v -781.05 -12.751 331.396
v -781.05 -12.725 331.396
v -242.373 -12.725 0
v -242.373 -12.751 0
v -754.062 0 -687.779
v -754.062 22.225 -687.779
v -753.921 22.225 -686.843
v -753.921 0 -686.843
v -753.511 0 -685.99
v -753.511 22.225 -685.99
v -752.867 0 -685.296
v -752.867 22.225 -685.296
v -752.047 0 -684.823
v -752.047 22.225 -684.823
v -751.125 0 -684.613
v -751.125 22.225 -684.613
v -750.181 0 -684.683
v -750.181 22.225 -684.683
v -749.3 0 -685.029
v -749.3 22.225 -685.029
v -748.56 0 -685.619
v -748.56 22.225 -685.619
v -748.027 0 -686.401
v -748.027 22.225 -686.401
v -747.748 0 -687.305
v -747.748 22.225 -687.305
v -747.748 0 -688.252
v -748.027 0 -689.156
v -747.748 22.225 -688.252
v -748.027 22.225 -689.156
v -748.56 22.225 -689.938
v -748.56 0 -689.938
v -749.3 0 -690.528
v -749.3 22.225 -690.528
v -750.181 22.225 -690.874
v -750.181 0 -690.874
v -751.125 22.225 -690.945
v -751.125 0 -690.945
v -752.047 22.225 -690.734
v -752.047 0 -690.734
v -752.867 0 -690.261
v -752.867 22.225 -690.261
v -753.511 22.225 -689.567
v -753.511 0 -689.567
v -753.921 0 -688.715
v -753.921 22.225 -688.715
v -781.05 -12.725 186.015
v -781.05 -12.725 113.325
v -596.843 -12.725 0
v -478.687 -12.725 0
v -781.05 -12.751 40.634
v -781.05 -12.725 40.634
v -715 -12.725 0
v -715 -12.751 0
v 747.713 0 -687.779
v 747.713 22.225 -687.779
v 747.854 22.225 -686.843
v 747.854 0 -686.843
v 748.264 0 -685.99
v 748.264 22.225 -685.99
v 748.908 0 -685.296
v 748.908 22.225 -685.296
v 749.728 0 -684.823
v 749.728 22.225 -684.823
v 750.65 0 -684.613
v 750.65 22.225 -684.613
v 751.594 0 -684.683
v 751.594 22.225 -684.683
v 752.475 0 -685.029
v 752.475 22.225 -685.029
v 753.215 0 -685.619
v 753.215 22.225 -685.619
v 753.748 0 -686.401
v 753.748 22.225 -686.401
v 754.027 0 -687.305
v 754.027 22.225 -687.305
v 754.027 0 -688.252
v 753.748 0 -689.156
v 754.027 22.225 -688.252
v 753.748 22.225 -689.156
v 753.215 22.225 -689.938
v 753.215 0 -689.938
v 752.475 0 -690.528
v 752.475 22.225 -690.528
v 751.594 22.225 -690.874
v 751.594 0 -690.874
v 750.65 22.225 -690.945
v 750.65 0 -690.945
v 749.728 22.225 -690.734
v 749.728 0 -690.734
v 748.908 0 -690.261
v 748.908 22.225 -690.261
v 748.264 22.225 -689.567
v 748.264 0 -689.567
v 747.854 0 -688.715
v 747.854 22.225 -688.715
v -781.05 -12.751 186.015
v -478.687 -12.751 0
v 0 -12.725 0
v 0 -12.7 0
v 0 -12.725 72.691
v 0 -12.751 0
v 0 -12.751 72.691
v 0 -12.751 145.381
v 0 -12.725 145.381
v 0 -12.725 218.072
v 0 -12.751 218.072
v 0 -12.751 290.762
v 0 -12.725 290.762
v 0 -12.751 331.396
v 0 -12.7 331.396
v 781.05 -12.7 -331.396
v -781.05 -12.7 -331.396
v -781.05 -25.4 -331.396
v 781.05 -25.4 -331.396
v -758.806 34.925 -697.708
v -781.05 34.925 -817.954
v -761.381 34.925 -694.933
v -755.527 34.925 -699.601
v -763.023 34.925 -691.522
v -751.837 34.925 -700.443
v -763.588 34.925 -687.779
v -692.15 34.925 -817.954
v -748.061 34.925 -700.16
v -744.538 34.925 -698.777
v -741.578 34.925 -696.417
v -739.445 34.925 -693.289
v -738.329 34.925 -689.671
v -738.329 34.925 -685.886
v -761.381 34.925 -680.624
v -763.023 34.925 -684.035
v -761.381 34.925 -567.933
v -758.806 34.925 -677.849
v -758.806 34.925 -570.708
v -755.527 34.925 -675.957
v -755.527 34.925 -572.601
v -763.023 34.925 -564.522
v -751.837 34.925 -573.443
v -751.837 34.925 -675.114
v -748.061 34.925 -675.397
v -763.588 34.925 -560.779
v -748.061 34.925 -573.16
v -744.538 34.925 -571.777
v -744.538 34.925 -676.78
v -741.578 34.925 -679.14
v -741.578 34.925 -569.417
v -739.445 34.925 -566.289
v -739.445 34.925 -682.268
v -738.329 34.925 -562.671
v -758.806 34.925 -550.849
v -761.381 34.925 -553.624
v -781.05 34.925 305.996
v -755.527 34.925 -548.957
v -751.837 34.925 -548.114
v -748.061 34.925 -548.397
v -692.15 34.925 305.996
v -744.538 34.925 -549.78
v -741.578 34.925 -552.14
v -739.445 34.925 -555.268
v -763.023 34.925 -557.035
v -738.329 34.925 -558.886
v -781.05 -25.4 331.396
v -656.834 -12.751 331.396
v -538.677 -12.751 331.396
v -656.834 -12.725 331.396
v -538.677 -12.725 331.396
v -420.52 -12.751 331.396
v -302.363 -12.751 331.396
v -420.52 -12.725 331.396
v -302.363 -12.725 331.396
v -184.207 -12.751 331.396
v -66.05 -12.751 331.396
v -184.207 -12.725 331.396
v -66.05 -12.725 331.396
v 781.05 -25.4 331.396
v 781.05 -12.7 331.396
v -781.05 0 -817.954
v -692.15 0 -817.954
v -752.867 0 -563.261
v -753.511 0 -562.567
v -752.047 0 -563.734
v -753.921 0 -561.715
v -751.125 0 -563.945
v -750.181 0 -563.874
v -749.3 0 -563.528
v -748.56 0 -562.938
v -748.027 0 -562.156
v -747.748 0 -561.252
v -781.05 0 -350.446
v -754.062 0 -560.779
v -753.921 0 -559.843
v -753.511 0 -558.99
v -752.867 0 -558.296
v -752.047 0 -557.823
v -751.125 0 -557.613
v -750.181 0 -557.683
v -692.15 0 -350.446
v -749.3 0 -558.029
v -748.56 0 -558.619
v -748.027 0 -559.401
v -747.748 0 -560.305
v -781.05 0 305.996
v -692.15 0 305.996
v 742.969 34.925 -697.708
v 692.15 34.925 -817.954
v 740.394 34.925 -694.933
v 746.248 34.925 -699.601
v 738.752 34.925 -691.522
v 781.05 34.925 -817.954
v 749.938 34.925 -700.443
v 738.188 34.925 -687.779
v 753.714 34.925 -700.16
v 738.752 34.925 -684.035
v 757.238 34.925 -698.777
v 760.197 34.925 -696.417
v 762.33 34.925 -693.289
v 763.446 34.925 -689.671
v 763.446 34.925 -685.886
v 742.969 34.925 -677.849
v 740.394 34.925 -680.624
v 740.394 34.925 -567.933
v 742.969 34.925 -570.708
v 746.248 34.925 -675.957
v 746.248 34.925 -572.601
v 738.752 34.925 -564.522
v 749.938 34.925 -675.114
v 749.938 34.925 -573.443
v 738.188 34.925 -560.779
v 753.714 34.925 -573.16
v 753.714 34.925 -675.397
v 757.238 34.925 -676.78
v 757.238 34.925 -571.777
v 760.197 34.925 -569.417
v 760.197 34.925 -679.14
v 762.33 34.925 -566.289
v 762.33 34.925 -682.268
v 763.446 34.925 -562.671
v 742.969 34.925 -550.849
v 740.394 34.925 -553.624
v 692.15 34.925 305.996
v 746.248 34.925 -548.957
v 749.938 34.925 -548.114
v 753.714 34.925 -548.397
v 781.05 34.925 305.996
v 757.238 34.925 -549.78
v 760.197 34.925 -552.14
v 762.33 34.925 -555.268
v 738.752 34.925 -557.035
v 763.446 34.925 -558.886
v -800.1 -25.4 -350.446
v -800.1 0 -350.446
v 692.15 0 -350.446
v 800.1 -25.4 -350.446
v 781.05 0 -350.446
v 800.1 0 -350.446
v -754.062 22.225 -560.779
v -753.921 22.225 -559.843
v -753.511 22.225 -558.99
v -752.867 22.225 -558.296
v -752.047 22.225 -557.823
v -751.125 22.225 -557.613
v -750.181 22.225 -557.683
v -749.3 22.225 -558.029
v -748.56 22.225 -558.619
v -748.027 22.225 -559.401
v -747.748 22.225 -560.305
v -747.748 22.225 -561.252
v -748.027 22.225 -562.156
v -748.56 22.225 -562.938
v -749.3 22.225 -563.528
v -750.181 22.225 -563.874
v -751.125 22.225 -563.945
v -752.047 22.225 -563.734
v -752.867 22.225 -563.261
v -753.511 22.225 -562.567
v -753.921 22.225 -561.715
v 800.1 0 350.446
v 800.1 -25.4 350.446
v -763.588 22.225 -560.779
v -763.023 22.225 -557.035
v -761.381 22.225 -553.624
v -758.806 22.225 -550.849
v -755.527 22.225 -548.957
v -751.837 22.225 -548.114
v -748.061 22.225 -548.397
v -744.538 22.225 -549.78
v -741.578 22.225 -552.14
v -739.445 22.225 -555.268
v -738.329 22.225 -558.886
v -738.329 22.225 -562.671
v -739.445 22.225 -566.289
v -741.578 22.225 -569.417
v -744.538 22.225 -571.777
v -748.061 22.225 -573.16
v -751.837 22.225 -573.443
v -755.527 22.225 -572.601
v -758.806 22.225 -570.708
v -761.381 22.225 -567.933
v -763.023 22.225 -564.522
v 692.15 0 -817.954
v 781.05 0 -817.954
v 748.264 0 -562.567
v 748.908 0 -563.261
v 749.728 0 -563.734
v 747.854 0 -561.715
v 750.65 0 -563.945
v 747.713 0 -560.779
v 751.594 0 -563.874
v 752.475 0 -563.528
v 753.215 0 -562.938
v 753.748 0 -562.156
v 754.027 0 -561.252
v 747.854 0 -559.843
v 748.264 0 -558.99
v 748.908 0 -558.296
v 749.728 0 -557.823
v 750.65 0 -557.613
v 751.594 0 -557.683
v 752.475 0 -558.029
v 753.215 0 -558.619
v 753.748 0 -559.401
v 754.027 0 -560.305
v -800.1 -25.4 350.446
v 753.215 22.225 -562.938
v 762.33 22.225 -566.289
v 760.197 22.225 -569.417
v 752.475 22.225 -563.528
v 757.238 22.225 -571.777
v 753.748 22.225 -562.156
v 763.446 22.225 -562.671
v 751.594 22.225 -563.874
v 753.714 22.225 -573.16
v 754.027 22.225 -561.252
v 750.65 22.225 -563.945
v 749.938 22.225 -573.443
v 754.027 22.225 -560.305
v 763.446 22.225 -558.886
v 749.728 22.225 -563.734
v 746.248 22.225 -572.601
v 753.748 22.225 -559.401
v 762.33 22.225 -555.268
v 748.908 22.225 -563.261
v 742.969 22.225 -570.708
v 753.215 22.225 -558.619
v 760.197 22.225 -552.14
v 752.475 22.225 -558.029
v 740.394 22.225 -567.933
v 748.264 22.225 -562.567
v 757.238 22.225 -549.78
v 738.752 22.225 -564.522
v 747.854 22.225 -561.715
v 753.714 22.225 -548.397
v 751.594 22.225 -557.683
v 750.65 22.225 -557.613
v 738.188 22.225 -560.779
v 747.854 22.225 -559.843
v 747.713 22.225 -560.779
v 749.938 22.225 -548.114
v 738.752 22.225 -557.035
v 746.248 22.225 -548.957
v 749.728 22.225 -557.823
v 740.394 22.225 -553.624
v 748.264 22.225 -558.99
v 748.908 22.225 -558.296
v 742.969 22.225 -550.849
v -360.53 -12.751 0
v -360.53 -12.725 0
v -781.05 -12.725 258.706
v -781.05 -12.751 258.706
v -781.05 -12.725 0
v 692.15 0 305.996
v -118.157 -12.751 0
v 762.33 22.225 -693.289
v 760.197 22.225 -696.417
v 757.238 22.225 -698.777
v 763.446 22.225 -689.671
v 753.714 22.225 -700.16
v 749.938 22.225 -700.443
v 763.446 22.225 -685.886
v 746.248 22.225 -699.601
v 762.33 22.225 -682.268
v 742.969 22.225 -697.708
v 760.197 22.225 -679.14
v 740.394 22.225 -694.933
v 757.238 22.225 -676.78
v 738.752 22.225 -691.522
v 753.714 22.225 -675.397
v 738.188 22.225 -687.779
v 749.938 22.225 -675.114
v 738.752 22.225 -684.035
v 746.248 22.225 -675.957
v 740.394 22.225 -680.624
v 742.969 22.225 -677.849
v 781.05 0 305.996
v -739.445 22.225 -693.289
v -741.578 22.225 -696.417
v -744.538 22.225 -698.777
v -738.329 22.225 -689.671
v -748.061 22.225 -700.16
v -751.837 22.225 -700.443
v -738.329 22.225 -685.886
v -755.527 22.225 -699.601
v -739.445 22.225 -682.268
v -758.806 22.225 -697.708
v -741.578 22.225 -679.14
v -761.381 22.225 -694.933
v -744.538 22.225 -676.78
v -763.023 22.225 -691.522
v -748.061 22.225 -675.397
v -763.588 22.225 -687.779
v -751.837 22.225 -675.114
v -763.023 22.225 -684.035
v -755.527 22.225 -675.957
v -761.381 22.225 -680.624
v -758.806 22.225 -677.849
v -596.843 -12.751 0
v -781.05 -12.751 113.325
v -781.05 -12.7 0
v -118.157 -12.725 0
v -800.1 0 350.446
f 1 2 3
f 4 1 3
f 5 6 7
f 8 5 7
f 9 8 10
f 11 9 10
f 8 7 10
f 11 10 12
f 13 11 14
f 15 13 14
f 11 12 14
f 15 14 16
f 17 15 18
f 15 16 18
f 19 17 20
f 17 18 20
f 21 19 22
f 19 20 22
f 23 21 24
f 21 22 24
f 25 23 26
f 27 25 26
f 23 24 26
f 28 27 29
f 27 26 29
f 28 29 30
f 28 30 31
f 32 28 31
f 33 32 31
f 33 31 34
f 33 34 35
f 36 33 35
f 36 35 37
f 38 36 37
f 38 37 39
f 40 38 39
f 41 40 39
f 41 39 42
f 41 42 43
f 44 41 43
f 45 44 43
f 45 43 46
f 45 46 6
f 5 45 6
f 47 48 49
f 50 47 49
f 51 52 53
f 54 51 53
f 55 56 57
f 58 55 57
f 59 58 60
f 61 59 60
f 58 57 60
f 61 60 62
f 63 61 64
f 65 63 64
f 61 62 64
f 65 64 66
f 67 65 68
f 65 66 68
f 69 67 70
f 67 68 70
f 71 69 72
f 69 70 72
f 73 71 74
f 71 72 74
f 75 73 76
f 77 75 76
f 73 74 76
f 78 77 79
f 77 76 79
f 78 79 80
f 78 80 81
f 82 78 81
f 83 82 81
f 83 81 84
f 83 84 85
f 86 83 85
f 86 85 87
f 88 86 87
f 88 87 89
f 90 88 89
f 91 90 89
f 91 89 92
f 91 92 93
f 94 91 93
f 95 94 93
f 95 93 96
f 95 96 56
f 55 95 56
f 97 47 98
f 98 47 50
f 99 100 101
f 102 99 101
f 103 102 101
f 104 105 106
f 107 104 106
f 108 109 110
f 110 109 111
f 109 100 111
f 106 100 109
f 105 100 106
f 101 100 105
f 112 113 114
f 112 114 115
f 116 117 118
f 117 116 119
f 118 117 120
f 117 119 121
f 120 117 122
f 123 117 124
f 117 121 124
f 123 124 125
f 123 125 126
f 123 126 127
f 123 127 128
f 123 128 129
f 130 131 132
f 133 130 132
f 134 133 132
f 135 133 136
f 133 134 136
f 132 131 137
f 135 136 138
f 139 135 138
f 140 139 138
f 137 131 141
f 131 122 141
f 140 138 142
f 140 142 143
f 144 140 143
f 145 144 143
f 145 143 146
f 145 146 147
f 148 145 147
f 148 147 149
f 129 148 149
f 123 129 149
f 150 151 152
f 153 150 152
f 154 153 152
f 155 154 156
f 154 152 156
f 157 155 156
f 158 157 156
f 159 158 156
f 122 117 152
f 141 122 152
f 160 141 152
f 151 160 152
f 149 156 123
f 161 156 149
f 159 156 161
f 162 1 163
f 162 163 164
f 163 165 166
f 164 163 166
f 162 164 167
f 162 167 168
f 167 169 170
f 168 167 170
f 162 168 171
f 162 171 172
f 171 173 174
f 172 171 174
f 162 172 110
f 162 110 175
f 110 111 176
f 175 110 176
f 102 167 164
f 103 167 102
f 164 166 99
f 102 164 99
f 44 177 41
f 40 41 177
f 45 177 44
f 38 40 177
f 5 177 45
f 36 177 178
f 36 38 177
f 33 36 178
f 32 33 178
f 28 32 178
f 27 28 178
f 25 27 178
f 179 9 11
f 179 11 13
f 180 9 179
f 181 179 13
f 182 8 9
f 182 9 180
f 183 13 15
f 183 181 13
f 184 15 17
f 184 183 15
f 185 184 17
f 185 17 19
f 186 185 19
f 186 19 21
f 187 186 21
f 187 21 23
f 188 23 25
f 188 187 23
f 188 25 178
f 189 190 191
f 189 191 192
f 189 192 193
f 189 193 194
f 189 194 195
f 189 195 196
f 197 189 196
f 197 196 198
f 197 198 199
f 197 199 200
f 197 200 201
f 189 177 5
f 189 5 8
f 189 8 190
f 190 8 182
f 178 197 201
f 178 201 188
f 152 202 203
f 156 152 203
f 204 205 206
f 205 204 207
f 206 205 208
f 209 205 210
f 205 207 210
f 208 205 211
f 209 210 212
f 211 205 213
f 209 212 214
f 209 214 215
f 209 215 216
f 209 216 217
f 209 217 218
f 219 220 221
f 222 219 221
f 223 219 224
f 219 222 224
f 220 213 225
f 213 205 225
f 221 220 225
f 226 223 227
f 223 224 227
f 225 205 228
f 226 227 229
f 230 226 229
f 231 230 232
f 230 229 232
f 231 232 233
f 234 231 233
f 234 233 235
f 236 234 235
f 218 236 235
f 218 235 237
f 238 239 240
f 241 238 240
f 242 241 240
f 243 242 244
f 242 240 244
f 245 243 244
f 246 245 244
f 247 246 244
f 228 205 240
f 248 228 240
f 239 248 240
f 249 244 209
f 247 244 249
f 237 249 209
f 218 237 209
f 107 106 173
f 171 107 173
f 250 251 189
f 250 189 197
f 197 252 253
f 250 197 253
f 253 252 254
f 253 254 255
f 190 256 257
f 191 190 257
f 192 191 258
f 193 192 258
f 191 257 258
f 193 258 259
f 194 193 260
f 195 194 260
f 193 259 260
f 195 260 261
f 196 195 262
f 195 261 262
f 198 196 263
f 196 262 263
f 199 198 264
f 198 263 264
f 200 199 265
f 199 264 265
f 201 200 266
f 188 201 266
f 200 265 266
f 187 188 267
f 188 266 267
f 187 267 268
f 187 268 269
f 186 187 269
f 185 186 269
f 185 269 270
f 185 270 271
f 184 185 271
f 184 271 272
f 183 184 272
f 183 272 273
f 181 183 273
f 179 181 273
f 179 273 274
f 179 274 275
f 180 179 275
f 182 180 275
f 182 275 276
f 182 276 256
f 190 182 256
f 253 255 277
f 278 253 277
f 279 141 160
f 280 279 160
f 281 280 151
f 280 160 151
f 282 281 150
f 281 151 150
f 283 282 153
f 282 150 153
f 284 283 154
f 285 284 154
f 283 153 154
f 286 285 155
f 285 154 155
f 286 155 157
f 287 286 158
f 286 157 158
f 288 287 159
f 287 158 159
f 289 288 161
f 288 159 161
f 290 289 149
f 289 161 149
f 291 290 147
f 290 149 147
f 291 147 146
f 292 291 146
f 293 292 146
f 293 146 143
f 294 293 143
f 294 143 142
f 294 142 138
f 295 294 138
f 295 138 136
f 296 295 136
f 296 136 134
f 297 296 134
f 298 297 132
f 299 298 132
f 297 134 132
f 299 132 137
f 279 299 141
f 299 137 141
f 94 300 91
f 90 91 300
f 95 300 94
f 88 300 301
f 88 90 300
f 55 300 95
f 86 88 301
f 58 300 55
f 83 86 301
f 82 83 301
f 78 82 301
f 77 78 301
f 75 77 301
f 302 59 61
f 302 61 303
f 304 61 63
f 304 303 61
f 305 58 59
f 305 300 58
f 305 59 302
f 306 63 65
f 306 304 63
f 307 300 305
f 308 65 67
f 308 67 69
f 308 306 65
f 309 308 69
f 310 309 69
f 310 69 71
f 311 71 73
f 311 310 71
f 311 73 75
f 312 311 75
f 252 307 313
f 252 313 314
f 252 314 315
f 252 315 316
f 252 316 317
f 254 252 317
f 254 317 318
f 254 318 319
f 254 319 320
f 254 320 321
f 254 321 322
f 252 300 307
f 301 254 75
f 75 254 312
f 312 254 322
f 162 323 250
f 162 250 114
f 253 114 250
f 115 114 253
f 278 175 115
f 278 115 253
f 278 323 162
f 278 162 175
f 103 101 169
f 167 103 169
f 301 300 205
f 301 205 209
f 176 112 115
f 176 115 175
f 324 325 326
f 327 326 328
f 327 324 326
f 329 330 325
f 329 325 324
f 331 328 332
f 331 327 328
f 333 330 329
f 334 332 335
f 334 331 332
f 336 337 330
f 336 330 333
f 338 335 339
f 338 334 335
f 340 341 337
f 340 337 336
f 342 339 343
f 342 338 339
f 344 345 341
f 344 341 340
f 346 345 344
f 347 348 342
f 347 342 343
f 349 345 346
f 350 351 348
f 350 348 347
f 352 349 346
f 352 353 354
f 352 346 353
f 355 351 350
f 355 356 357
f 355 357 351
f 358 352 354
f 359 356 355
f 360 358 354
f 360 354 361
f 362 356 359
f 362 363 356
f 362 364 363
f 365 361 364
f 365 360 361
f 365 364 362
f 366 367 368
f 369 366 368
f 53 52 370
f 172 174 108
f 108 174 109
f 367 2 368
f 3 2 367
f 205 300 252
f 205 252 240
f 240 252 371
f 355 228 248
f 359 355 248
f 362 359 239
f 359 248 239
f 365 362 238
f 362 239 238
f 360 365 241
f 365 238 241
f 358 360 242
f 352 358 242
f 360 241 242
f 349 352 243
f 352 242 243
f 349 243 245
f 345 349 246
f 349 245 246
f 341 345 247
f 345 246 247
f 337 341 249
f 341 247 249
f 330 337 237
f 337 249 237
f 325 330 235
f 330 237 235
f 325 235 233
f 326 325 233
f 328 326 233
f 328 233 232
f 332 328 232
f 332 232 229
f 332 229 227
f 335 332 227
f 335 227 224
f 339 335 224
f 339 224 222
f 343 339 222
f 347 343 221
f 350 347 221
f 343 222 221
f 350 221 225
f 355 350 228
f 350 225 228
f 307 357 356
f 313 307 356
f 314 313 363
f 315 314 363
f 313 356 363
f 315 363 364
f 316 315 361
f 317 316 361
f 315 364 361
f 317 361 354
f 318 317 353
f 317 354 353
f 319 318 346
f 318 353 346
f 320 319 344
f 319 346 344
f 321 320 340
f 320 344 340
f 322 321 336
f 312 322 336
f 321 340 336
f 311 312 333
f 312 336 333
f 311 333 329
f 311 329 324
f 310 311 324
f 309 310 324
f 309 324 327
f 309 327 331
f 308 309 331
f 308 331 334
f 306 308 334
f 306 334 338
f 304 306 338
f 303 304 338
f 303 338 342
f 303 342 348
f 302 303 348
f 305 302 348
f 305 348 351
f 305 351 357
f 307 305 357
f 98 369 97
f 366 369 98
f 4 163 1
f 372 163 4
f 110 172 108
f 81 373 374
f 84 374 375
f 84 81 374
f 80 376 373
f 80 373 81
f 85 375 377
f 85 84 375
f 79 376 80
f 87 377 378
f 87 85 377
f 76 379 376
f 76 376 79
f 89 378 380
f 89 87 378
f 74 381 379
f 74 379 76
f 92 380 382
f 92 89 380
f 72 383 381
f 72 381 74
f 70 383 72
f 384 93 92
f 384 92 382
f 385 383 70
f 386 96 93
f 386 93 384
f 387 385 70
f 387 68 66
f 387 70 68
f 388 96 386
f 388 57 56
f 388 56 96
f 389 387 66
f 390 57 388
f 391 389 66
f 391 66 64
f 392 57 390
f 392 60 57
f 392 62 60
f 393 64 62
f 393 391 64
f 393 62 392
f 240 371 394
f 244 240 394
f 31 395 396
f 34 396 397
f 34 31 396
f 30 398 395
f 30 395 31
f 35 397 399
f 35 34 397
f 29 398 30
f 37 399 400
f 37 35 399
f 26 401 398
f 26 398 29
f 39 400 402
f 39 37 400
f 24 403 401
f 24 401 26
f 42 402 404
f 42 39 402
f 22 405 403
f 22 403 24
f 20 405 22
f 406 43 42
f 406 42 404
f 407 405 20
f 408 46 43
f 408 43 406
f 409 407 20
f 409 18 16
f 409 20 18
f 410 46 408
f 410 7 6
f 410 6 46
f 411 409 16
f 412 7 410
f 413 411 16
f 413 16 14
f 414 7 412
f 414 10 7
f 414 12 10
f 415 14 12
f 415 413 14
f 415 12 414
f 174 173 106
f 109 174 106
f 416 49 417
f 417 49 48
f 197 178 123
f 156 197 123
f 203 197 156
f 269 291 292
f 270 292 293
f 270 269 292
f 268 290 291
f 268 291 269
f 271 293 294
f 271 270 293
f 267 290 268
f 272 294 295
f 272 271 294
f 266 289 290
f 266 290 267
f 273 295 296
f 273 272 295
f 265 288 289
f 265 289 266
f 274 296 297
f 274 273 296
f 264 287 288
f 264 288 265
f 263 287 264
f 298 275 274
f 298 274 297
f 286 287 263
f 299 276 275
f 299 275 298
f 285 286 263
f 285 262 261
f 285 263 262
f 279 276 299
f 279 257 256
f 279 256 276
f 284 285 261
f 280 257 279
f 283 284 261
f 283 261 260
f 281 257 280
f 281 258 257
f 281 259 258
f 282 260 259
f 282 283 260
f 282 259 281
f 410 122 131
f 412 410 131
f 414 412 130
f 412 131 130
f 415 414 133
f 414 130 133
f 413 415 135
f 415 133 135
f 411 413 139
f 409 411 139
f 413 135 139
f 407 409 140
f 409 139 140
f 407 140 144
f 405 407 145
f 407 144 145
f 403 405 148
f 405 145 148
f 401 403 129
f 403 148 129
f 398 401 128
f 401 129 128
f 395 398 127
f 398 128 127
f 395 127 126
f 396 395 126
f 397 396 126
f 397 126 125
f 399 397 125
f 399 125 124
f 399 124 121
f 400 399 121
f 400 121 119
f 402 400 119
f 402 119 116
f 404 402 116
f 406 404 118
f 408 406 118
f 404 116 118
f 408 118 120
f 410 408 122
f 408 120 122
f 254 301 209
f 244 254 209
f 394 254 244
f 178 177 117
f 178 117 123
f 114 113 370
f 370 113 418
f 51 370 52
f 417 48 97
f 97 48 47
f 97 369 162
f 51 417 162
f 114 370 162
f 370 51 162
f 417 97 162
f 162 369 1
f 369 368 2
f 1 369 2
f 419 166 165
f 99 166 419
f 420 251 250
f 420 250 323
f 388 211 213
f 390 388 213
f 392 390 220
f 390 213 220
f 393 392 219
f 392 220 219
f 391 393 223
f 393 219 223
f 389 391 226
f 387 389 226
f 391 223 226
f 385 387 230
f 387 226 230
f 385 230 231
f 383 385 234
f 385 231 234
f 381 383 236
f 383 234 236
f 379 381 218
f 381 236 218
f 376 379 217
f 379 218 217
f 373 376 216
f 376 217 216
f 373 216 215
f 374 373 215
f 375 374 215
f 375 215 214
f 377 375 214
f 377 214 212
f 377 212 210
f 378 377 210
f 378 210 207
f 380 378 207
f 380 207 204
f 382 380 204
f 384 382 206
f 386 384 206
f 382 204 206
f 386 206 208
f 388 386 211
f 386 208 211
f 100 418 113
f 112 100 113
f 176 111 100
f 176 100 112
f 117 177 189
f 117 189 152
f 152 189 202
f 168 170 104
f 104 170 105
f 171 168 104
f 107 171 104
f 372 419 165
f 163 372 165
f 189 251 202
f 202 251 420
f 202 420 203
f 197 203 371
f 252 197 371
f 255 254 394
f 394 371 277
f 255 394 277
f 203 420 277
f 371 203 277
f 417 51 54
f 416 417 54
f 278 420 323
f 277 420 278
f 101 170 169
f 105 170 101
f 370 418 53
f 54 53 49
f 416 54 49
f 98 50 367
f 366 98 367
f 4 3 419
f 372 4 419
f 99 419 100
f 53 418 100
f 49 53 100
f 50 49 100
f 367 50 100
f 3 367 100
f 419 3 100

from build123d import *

# Parameters (mm, degrees)
F0_W      = 1562.1
F0_H      = 662.792688
F1_DEPTH  = 12.7
F2_W      = 1600.2
F2_H      = 700.892688
F2_W_2    = 1562.1
F2_H_2    = 662.792688
F3_DEPTH  = 25.4
F5_DEPTH  = 0.0254
F7_DEPTH  = 0.0508
F8_W      = 88.9
F8_H      = 1123.95
F9_DEPTH  = 34.925
F10_R     = 3.175
F11_DEPTH = 60.326
F12_R     = 12.7
F13_DEPTH = 12.7


with BuildPart() as f1:
    # F0 (on Front) → F1 (new body)
    with BuildSketch(Plane.XZ):
        Rectangle(F0_W, F0_H)
    extrude(amount=F1_DEPTH)

    # F2 (on Front) → F3 (join)
    with BuildSketch(Plane.XZ):
        Rectangle(F2_W, F2_H)
        Rectangle(F2_W_2, F2_H_2, mode=Mode.SUBTRACT)
    extrude(amount=F3_DEPTH)

    # F4 (on face) → F5 (join)
    with BuildSketch(Plane.XZ.offset(12.7)):
        Polygon((-118.156804, 0), (0, 0), (-538.677069, 331.396344), (-656.833873, 331.396344), align=None)
        Polygon((-242.372931, 0), (-781.05, 331.396344), (-781.05, 258.705793), (-360.529735, 0), align=None)
        Polygon((-596.843343, 0), (-478.686539, 0), (-781.05, 186.015242), (-781.05, 113.324691), align=None)
        Polygon((-781.05, 0), (-715.000147, 0), (-781.05, 40.63414), align=None)
        Polygon((-420.520265, 331.396344), (0, 72.690551), (0, 145.381102), (-302.363461, 331.396344), align=None)
        Polygon((-184.206657, 331.396344), (0, 218.071652), (0, 290.762203), (-66.049853, 331.396344), align=None)
    extrude(amount=F5_DEPTH)

    # F6 (on face) → F7 (join)
    with BuildSketch(Plane.XZ.offset(12.7)):
        Polygon((-596.843343, 0), (-781.05, 113.324691), (-781.05, 40.63414), (-715.000147, 0), align=None)
        Polygon((-781.05, 258.705793), (-781.05, 186.015242), (-478.686539, 0), (-360.529735, 0), align=None)
        Polygon((-656.833873, 331.396344), (-781.05, 331.396344), (-242.372931, 0), (-118.156804, 0), align=None)
        Polygon((-420.520265, 331.396344), (-538.677069, 331.396344), (0, 0), (0, 72.690551), align=None)
        Polygon((-184.206657, 331.396344), (-302.363461, 331.396344), (0, 145.381102), (0, 218.071652), align=None)
        Polygon((0, 331.396344), (-66.049853, 331.396344), (0, 290.762203), align=None)
    extrude(amount=F7_DEPTH)

    # F8 (on Front) → F9 (join)
    with BuildSketch(Plane.XZ):
        with Locations((736.6, -255.978656)):
            Rectangle(F8_W, F8_H)
        with Locations((-736.6, -255.978656)):
            Rectangle(F8_W, F8_H)
    extrude(amount=-F9_DEPTH)

    # F10 (on face) → F11 (cut, through all)
    with BuildSketch(Plane(origin=(0, 34.925, 0), x_dir=(-1, 0, 0), z_dir=(0, 1, 0))):
        with Locations((-750.8875, -687.778656)):
            Circle(F10_R)
        with Locations((-750.8875, -560.778656)):
            Circle(F10_R)
        with Locations((750.8875, -560.778656)):
            Circle(F10_R)
        with Locations((750.8875, -687.778656)):
            Circle(F10_R)
    extrude(amount=-F11_DEPTH, mode=Mode.SUBTRACT)

    # F12 (on face) → F13 (cut)
    with BuildSketch(Plane(origin=(0, 34.925, 0), x_dir=(-1, 0, 0), z_dir=(0, 1, 0))):
        with Locations((-750.8875, -687.778656)):
            Circle(F12_R)
        with Locations((-750.8875, -560.778656)):
            Circle(F12_R)
        with Locations((750.8875, -687.778656)):
            Circle(F12_R)
        with Locations((750.8875, -560.778656)):
            Circle(F12_R)
    extrude(amount=-F13_DEPTH, mode=Mode.SUBTRACT)


solid = f1.part
